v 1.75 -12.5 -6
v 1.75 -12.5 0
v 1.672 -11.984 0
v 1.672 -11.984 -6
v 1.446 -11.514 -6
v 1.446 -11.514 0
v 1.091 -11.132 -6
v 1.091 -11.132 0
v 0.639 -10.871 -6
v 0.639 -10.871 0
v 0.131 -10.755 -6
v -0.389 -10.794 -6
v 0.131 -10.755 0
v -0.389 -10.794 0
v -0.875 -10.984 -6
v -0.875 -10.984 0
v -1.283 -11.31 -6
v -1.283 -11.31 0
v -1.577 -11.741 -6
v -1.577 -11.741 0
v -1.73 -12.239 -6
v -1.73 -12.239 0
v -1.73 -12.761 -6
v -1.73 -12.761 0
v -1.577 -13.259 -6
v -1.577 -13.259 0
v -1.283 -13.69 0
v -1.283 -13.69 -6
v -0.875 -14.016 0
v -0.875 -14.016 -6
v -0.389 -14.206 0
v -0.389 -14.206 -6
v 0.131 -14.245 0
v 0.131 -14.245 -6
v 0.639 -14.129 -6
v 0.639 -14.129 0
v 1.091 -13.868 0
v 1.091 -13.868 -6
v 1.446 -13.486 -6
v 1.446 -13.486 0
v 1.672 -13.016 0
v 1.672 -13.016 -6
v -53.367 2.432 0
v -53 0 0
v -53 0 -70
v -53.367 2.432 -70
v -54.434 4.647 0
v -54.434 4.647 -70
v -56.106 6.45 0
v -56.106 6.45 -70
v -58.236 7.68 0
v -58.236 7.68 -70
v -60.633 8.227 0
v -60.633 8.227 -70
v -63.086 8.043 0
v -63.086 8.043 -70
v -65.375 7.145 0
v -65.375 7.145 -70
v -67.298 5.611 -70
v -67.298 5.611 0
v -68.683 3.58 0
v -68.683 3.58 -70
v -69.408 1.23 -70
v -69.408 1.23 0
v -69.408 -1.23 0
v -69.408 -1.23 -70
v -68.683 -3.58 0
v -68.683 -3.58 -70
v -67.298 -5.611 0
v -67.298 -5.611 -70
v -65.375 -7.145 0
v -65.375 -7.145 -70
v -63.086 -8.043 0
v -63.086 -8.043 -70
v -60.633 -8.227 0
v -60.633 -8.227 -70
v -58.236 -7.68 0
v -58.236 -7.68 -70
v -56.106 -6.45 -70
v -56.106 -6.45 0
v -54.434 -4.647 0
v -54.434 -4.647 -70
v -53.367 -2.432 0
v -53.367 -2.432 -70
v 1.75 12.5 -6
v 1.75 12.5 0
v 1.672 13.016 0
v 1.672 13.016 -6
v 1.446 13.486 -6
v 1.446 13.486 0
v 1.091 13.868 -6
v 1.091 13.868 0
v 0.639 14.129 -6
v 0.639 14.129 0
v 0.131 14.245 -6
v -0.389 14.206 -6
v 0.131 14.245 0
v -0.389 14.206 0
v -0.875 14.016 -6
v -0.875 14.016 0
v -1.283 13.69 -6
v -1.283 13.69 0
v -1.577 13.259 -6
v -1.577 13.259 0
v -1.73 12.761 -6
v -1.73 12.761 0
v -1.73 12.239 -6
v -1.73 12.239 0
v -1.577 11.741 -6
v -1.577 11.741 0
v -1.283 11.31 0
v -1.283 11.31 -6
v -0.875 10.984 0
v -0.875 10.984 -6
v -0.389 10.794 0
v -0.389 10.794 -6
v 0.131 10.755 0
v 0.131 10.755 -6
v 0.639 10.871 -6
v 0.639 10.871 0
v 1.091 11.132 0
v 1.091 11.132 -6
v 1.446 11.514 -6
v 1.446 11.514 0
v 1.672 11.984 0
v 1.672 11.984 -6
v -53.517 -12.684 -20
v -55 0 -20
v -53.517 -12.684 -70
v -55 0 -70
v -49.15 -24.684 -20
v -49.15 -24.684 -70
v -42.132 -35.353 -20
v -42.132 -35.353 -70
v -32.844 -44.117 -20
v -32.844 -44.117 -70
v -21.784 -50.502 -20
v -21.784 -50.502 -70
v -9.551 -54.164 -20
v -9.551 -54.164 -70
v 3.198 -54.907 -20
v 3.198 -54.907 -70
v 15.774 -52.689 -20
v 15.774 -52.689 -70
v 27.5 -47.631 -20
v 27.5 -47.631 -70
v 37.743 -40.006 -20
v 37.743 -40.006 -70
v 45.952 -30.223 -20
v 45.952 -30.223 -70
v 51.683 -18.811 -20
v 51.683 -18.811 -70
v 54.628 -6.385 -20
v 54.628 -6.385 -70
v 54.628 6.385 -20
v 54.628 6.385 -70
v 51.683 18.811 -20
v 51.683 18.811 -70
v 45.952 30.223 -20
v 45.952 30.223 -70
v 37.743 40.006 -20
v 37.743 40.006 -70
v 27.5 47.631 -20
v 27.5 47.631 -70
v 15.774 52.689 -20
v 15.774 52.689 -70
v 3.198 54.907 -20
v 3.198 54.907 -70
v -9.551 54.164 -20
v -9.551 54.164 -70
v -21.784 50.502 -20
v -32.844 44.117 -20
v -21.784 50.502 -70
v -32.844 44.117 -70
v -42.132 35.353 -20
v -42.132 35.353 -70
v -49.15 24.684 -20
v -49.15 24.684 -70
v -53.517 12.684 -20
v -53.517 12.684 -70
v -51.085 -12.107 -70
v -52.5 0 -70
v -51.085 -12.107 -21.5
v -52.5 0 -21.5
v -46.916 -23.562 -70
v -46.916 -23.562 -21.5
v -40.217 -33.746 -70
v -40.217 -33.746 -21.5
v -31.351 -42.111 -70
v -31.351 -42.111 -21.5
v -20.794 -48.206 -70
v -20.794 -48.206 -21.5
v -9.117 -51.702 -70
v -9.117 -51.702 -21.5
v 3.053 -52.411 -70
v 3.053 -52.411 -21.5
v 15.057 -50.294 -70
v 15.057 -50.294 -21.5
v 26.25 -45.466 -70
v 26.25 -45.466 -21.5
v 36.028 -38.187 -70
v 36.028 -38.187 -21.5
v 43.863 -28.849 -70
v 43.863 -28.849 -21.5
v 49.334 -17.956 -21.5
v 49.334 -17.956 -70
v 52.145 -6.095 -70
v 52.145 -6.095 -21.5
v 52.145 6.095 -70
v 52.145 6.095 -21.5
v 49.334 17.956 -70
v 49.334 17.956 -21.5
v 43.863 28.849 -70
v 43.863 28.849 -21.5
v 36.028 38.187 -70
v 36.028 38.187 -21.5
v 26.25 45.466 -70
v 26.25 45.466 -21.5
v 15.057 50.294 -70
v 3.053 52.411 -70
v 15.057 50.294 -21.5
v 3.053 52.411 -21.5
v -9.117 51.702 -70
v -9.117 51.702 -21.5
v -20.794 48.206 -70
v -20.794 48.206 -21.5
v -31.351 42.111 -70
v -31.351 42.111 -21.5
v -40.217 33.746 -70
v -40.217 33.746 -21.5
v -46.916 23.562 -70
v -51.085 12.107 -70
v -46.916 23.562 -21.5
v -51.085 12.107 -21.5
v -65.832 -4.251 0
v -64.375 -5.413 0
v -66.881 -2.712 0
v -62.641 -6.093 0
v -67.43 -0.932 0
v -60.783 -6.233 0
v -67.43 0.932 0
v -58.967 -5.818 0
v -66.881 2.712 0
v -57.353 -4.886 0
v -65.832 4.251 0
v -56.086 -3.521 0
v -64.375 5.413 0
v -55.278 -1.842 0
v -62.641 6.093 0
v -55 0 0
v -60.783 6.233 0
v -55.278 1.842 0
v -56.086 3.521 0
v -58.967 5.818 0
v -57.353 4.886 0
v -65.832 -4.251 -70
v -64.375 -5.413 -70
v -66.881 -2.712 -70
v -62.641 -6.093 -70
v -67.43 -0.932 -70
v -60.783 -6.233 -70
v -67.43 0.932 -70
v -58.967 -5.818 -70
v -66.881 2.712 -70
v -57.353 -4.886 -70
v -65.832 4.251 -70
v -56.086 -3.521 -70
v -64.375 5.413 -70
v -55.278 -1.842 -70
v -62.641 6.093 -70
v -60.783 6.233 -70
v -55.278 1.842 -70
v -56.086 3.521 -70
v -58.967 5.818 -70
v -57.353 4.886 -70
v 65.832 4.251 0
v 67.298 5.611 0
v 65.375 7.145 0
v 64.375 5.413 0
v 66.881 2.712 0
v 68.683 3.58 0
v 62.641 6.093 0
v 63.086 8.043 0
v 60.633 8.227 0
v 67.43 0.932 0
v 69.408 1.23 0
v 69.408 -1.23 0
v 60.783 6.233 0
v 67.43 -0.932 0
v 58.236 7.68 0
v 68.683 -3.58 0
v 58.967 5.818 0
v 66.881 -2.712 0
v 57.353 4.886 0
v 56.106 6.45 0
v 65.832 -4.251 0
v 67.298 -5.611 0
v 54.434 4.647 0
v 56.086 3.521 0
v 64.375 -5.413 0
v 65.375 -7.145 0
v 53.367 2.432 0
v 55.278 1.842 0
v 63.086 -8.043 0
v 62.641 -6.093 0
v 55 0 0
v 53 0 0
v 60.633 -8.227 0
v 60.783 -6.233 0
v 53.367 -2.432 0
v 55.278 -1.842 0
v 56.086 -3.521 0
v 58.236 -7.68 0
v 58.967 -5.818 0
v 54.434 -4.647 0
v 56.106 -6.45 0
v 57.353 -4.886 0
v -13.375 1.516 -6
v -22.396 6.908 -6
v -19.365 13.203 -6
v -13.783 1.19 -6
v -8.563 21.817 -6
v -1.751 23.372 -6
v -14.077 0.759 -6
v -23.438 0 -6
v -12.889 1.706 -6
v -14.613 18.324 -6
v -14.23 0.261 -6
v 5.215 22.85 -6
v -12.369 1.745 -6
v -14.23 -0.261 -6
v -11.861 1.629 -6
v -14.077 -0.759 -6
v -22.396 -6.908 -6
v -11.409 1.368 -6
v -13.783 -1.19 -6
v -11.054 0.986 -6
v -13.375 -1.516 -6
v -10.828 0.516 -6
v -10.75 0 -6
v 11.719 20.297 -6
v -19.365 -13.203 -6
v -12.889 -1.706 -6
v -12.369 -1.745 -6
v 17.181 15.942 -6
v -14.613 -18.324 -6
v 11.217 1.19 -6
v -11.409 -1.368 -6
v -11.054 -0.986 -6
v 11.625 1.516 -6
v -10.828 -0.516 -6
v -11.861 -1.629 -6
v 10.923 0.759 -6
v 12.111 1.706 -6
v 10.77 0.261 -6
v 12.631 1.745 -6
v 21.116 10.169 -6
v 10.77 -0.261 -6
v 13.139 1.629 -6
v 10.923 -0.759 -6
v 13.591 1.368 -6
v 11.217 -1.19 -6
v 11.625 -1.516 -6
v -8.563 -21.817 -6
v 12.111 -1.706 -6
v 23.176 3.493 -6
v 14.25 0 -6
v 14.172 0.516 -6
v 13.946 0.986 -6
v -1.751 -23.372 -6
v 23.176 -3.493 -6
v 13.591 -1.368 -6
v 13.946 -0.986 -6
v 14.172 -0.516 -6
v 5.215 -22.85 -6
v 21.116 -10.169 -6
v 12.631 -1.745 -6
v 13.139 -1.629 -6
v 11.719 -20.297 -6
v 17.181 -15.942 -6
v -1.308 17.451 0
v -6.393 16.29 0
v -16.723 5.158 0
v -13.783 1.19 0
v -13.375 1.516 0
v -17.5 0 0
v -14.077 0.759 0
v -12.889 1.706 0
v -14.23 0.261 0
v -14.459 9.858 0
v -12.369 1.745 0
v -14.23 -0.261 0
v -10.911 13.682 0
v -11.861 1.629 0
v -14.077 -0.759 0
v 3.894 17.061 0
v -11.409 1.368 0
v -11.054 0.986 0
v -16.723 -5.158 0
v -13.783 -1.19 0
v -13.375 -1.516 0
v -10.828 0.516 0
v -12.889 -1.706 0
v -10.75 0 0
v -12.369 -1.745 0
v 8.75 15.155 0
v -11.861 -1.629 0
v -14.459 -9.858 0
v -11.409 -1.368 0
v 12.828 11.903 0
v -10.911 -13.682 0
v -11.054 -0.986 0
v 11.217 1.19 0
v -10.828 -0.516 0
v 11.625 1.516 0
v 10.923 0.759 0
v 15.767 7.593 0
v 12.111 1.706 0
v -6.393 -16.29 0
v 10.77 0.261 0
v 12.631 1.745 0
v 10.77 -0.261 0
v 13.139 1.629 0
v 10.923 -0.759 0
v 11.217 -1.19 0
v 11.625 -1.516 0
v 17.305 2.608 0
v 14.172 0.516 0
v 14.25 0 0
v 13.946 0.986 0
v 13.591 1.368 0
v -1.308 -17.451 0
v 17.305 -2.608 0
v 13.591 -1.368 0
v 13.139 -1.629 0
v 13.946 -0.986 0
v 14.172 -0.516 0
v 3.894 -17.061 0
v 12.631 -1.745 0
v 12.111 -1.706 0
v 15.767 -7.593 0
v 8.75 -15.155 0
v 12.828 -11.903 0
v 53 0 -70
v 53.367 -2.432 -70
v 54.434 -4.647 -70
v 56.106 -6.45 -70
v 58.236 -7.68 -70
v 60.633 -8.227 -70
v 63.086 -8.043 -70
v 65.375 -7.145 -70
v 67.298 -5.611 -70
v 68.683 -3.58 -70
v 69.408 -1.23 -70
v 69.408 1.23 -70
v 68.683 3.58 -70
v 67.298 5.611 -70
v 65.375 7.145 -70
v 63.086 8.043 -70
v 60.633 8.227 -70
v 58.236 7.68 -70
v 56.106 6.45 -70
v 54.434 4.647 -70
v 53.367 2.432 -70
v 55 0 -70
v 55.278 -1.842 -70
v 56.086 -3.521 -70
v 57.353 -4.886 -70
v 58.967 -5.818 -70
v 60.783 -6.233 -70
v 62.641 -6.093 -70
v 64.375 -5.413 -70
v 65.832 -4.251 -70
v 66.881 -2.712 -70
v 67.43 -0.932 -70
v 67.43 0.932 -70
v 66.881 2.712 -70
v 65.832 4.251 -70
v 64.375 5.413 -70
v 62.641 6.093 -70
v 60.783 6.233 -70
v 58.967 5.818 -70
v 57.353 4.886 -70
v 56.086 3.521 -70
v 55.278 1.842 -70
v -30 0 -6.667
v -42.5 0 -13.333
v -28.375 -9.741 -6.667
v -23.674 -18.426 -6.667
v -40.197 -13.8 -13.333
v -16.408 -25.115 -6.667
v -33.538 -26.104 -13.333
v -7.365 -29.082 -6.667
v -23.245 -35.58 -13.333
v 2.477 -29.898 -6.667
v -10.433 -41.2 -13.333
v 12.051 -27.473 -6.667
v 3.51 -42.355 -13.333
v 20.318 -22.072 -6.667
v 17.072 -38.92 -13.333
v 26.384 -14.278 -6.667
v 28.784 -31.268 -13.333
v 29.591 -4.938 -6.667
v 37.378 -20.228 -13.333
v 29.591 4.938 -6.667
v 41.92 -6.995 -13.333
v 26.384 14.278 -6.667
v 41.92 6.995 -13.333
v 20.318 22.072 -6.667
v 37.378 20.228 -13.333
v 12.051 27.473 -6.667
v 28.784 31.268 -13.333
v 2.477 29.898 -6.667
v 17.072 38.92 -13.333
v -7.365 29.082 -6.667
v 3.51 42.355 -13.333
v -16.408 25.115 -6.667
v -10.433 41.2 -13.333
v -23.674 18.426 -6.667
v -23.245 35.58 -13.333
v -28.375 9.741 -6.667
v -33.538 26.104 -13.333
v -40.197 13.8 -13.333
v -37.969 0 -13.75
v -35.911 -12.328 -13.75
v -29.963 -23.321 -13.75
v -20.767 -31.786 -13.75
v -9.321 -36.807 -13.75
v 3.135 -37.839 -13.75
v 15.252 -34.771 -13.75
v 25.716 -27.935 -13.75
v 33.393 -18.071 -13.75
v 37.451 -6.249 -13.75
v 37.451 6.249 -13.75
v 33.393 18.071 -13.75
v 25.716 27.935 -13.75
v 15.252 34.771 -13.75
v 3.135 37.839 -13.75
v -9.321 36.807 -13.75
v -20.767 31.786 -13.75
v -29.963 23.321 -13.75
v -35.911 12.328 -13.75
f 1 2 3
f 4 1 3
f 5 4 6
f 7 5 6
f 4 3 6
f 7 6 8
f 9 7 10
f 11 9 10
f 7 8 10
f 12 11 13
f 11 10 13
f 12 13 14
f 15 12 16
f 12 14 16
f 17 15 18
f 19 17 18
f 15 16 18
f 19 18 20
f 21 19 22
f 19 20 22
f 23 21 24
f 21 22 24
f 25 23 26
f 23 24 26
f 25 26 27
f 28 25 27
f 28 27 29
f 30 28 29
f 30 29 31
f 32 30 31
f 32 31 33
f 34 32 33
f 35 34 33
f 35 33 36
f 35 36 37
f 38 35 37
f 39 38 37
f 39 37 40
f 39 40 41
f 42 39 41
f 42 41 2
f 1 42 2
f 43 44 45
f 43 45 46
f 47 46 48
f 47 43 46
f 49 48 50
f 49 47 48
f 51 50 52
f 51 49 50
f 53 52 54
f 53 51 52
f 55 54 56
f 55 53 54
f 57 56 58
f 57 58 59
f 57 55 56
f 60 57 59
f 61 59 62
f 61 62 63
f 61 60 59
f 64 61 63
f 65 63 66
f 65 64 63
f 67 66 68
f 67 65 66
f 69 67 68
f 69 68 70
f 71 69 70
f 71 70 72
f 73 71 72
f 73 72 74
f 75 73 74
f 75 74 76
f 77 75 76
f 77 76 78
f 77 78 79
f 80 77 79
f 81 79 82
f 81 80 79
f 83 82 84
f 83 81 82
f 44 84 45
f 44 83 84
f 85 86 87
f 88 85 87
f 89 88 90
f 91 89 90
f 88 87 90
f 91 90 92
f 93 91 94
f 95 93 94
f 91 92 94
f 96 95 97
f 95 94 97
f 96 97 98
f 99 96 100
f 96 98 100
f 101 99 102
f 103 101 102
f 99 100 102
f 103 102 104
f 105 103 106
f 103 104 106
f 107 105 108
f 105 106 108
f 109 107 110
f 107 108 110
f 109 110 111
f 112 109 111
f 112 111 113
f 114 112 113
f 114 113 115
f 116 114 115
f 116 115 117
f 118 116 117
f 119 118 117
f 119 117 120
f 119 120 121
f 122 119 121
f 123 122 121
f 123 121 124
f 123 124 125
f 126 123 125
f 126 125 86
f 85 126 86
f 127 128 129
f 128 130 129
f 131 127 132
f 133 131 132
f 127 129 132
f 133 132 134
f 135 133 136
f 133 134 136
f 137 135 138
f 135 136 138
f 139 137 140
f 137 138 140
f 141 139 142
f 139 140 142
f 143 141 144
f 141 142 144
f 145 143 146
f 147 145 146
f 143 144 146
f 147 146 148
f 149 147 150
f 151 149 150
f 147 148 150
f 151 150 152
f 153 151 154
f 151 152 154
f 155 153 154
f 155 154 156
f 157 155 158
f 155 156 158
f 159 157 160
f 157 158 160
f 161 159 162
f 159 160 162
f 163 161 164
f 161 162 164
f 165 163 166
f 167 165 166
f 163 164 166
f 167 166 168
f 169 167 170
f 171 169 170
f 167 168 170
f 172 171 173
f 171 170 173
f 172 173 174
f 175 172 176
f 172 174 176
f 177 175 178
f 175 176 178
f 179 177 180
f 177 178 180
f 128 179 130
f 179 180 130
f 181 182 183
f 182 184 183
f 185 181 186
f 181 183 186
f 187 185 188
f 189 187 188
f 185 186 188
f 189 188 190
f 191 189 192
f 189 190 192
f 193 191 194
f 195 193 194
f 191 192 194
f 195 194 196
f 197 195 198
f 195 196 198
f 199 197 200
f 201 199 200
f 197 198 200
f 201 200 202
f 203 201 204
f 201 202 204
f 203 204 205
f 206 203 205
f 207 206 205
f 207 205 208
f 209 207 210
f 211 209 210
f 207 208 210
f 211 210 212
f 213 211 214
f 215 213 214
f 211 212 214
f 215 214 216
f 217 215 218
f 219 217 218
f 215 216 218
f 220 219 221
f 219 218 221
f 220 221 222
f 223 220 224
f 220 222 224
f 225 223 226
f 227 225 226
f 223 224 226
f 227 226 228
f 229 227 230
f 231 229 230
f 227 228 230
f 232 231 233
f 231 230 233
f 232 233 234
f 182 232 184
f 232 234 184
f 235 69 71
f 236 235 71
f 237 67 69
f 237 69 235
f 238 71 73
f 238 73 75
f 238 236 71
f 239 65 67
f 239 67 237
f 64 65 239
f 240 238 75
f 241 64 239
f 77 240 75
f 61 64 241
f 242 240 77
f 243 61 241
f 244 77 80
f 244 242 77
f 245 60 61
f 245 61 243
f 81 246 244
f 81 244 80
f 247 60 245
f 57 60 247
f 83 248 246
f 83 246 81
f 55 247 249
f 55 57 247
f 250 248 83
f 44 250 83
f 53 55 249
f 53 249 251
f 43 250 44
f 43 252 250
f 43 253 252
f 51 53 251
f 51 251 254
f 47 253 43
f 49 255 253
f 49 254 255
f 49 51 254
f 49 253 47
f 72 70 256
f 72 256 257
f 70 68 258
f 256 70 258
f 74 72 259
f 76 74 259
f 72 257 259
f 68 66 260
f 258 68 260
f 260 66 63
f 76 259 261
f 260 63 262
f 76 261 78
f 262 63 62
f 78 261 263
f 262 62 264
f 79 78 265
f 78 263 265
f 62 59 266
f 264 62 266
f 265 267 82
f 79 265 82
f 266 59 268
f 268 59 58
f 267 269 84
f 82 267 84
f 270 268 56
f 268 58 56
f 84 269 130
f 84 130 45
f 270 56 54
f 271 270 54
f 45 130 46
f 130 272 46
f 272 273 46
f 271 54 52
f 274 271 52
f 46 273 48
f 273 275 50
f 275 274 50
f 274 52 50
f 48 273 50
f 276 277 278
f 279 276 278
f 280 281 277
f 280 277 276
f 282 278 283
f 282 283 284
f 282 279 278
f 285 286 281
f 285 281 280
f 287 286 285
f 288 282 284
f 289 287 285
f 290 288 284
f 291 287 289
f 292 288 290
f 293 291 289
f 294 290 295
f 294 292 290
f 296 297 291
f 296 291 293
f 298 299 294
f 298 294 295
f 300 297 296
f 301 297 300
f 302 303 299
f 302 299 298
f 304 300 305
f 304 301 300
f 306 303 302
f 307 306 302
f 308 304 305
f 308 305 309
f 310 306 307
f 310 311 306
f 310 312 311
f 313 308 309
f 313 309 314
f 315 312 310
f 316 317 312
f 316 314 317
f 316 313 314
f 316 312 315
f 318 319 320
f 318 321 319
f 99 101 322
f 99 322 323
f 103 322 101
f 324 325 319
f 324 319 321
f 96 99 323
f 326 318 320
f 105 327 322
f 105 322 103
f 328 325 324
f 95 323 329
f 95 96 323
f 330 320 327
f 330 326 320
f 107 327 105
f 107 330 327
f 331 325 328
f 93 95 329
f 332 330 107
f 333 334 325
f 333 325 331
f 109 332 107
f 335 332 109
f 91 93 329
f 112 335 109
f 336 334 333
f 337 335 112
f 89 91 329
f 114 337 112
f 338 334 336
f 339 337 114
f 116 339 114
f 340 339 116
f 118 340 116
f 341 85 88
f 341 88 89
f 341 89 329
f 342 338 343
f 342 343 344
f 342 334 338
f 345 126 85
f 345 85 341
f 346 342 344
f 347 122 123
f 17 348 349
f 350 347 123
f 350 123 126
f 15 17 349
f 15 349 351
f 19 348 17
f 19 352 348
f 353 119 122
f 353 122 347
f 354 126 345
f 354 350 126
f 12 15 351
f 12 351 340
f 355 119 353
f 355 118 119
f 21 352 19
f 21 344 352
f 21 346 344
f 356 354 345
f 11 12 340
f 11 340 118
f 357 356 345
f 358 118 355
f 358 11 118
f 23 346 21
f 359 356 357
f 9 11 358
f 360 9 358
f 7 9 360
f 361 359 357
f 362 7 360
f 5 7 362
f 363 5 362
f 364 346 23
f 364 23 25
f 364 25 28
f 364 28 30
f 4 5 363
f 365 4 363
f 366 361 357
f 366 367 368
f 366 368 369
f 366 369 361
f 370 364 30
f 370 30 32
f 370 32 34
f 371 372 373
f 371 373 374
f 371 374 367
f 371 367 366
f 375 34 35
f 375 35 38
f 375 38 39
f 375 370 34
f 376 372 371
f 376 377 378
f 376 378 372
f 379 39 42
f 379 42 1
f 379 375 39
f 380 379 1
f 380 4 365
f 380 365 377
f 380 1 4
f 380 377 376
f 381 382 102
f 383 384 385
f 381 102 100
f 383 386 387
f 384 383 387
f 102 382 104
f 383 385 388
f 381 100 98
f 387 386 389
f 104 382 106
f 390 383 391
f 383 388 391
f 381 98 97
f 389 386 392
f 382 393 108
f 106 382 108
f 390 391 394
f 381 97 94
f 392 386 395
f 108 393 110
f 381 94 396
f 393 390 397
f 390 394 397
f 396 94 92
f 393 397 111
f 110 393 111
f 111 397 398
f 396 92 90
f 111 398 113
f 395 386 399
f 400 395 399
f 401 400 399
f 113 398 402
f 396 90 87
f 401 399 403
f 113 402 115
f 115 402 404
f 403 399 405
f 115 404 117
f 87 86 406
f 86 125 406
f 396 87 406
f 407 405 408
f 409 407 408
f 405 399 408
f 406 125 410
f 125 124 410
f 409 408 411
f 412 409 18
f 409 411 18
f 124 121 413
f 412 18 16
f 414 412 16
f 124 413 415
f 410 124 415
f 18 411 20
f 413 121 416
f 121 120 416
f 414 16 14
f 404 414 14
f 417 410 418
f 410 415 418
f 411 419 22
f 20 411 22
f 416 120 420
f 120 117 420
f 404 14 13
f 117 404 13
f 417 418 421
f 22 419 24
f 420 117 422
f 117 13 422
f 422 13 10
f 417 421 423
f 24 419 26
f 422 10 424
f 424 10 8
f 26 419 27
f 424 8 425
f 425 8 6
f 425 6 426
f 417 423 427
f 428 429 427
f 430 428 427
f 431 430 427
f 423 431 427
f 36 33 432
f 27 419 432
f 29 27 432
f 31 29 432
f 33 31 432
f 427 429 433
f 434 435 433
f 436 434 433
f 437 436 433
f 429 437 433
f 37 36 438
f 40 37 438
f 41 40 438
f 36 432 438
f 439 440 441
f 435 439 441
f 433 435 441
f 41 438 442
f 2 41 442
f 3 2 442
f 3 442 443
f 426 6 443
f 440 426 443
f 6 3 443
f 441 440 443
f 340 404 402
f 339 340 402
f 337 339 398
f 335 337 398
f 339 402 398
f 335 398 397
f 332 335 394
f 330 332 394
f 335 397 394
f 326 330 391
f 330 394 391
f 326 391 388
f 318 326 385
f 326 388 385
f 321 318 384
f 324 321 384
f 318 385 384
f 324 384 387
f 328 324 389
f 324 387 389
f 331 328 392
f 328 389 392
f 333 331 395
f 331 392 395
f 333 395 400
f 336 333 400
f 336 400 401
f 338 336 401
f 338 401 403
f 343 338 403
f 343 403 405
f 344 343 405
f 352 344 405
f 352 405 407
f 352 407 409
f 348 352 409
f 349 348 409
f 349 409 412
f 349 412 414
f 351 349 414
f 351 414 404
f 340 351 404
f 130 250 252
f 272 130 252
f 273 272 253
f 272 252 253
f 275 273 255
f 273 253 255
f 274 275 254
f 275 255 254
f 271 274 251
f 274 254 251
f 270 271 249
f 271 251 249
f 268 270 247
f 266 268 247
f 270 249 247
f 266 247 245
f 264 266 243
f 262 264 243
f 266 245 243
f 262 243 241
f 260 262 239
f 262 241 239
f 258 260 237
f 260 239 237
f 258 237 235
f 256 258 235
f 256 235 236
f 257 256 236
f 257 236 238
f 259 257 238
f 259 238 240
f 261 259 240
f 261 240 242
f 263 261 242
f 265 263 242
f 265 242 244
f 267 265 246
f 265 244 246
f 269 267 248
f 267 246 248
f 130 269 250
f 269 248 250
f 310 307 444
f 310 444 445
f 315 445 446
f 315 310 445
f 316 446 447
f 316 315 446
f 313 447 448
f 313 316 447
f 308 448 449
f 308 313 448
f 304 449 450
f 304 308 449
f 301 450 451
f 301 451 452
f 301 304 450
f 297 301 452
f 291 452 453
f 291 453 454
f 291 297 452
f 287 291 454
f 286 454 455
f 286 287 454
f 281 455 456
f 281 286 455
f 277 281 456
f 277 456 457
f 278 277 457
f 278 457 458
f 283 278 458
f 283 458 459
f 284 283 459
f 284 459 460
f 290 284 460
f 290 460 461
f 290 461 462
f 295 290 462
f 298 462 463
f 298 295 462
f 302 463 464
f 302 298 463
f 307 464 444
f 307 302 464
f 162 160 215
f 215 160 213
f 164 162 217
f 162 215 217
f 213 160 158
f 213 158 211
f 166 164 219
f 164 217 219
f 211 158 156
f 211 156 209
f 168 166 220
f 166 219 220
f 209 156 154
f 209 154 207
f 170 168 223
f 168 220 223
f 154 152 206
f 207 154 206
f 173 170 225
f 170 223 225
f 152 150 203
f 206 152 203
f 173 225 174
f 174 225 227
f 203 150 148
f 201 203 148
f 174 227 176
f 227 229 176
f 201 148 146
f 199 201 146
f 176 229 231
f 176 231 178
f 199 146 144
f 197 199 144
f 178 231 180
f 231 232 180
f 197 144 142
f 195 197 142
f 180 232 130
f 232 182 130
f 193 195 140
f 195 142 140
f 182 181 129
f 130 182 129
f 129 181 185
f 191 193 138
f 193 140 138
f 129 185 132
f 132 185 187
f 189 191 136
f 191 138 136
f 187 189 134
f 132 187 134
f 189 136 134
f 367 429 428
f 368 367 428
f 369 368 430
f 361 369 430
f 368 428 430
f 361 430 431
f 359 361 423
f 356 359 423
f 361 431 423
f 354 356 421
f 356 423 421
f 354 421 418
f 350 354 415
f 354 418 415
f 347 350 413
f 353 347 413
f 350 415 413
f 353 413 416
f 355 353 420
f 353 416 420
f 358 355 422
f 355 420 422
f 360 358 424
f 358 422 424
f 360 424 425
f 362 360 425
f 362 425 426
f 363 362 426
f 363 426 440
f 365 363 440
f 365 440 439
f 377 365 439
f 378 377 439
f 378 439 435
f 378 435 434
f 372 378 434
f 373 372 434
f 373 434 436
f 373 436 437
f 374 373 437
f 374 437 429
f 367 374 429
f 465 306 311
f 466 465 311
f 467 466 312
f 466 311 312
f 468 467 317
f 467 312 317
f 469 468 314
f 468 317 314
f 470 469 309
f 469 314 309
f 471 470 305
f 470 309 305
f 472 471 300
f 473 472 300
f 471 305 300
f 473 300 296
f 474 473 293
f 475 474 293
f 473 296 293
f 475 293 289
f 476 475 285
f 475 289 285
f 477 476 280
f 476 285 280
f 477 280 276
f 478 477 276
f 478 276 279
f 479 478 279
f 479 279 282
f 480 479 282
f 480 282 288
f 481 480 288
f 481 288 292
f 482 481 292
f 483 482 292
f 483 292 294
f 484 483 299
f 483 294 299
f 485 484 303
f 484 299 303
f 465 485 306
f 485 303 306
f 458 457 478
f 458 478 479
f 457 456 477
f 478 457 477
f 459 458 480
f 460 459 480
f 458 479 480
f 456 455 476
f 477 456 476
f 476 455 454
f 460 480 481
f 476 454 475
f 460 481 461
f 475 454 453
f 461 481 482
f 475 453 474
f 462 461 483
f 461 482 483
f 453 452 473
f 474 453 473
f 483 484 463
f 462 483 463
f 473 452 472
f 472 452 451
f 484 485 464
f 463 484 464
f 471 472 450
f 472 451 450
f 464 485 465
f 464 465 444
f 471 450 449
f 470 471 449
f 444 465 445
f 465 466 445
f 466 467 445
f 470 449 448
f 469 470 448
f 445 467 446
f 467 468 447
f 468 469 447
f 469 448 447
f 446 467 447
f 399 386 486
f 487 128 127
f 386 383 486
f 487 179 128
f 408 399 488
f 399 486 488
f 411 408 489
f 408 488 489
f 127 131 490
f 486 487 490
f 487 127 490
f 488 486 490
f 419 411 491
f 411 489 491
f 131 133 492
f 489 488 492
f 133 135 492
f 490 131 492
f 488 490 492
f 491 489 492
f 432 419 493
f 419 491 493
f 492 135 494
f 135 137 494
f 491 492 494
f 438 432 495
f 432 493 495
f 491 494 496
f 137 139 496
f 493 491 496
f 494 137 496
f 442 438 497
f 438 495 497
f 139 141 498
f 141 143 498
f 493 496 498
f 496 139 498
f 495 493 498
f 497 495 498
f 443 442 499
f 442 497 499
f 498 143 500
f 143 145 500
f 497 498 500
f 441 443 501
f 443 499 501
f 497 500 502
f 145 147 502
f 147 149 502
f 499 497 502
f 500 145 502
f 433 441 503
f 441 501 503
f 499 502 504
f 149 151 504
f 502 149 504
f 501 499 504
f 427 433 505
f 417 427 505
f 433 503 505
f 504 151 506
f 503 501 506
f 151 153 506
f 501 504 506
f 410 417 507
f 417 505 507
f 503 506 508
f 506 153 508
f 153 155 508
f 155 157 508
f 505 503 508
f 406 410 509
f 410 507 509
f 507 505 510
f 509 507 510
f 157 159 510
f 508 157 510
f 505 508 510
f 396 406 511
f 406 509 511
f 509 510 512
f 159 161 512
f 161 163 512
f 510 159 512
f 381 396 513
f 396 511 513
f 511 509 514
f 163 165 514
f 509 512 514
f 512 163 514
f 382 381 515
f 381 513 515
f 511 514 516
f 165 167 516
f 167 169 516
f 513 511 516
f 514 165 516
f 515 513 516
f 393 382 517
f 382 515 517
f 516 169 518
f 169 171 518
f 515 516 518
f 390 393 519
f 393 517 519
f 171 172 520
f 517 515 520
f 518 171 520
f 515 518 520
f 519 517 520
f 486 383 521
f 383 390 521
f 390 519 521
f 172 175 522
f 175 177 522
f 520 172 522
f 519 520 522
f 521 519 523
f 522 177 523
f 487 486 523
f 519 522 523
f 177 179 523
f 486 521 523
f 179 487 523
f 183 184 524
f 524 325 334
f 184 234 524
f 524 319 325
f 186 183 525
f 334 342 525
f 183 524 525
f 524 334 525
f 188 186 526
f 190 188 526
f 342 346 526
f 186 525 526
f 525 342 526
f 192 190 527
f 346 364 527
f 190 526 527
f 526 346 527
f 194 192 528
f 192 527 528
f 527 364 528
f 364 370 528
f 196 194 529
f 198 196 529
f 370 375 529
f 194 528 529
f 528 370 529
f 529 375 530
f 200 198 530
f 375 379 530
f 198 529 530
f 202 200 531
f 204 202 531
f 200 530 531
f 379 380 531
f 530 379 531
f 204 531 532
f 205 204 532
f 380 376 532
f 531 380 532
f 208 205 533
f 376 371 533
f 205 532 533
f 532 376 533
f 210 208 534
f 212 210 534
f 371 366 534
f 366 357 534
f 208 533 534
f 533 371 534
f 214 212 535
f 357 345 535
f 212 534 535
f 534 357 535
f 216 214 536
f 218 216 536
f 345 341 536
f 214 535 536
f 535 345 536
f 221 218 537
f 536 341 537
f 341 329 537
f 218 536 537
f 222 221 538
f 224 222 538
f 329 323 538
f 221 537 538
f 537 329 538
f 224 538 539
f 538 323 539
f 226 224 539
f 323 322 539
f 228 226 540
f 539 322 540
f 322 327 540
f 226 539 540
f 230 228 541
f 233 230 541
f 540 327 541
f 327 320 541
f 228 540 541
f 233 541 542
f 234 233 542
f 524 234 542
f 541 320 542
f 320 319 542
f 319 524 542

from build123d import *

# Parameters (mm, degrees)
SKETCH3_R             = 1.75
CUT_EXTRUDE1_DEPTH    = 105.642247682
SKETCH4_R             = 8.25
SKETCH4_R_2           = 6.25
BOSS_EXTRUDE1_DEPTH   = 70
BOSS_EXTRUDE1_2_DEPTH = 70


with BuildPart() as part:
    # Sketch2 → Revolve1 (revolve)
    with BuildSketch(Plane(origin=(0, 0, 0), x_dir=(1, 0, 0), z_dir=(0, 1, 0))):
        Polygon((0, 0), (-17.5, 0), (-55, 20), (-55, 70), (-52.5, 70), (-52.5, 21.5), (-23.4375, 6), (-15, 6), (0, 6), align=None)
    revolve(axis=Axis((0, 0, -52.255434783), (0, 0, 1)))

    # Sketch3 → Cut-Extrude1 (cut, through all)
    with BuildSketch(Plane.XY):
        with Locations((0, 12.5)):
            Circle(SKETCH3_R)
        with Locations((12.5, 0)):
            Circle(SKETCH3_R)
        with Locations((0, -12.5)):
            Circle(SKETCH3_R)
        with Locations((-12.5, 0)):
            Circle(SKETCH3_R)
    extrude(amount=-CUT_EXTRUDE1_DEPTH, mode=Mode.SUBTRACT)


with BuildPart() as body_2:
    # Sketch4 → Boss-Extrude1 (new body)
    with BuildSketch(Plane.XY):
        with Locations((-61.25, 0)):
            Circle(SKETCH4_R)
        with Locations((-61.25, 0)):
            Circle(SKETCH4_R_2, mode=Mode.SUBTRACT)
    extrude(amount=-BOSS_EXTRUDE1_DEPTH)


with BuildPart() as body_3:
    # Sketch4 → Boss-Extrude1 2 (new body)
    with BuildSketch(Plane.XY):
        with Locations(Location((61.25, 0, 0), (0, 0, 180))):
            Circle(SKETCH4_R)
        with Locations(Location((61.25, 0, 0), (0, 0, 180))):
            Circle(SKETCH4_R_2, mode=Mode.SUBTRACT)
    extrude(amount=-BOSS_EXTRUDE1_2_DEPTH)


solid = Compound([part.part, body_2.part, body_3.part])
